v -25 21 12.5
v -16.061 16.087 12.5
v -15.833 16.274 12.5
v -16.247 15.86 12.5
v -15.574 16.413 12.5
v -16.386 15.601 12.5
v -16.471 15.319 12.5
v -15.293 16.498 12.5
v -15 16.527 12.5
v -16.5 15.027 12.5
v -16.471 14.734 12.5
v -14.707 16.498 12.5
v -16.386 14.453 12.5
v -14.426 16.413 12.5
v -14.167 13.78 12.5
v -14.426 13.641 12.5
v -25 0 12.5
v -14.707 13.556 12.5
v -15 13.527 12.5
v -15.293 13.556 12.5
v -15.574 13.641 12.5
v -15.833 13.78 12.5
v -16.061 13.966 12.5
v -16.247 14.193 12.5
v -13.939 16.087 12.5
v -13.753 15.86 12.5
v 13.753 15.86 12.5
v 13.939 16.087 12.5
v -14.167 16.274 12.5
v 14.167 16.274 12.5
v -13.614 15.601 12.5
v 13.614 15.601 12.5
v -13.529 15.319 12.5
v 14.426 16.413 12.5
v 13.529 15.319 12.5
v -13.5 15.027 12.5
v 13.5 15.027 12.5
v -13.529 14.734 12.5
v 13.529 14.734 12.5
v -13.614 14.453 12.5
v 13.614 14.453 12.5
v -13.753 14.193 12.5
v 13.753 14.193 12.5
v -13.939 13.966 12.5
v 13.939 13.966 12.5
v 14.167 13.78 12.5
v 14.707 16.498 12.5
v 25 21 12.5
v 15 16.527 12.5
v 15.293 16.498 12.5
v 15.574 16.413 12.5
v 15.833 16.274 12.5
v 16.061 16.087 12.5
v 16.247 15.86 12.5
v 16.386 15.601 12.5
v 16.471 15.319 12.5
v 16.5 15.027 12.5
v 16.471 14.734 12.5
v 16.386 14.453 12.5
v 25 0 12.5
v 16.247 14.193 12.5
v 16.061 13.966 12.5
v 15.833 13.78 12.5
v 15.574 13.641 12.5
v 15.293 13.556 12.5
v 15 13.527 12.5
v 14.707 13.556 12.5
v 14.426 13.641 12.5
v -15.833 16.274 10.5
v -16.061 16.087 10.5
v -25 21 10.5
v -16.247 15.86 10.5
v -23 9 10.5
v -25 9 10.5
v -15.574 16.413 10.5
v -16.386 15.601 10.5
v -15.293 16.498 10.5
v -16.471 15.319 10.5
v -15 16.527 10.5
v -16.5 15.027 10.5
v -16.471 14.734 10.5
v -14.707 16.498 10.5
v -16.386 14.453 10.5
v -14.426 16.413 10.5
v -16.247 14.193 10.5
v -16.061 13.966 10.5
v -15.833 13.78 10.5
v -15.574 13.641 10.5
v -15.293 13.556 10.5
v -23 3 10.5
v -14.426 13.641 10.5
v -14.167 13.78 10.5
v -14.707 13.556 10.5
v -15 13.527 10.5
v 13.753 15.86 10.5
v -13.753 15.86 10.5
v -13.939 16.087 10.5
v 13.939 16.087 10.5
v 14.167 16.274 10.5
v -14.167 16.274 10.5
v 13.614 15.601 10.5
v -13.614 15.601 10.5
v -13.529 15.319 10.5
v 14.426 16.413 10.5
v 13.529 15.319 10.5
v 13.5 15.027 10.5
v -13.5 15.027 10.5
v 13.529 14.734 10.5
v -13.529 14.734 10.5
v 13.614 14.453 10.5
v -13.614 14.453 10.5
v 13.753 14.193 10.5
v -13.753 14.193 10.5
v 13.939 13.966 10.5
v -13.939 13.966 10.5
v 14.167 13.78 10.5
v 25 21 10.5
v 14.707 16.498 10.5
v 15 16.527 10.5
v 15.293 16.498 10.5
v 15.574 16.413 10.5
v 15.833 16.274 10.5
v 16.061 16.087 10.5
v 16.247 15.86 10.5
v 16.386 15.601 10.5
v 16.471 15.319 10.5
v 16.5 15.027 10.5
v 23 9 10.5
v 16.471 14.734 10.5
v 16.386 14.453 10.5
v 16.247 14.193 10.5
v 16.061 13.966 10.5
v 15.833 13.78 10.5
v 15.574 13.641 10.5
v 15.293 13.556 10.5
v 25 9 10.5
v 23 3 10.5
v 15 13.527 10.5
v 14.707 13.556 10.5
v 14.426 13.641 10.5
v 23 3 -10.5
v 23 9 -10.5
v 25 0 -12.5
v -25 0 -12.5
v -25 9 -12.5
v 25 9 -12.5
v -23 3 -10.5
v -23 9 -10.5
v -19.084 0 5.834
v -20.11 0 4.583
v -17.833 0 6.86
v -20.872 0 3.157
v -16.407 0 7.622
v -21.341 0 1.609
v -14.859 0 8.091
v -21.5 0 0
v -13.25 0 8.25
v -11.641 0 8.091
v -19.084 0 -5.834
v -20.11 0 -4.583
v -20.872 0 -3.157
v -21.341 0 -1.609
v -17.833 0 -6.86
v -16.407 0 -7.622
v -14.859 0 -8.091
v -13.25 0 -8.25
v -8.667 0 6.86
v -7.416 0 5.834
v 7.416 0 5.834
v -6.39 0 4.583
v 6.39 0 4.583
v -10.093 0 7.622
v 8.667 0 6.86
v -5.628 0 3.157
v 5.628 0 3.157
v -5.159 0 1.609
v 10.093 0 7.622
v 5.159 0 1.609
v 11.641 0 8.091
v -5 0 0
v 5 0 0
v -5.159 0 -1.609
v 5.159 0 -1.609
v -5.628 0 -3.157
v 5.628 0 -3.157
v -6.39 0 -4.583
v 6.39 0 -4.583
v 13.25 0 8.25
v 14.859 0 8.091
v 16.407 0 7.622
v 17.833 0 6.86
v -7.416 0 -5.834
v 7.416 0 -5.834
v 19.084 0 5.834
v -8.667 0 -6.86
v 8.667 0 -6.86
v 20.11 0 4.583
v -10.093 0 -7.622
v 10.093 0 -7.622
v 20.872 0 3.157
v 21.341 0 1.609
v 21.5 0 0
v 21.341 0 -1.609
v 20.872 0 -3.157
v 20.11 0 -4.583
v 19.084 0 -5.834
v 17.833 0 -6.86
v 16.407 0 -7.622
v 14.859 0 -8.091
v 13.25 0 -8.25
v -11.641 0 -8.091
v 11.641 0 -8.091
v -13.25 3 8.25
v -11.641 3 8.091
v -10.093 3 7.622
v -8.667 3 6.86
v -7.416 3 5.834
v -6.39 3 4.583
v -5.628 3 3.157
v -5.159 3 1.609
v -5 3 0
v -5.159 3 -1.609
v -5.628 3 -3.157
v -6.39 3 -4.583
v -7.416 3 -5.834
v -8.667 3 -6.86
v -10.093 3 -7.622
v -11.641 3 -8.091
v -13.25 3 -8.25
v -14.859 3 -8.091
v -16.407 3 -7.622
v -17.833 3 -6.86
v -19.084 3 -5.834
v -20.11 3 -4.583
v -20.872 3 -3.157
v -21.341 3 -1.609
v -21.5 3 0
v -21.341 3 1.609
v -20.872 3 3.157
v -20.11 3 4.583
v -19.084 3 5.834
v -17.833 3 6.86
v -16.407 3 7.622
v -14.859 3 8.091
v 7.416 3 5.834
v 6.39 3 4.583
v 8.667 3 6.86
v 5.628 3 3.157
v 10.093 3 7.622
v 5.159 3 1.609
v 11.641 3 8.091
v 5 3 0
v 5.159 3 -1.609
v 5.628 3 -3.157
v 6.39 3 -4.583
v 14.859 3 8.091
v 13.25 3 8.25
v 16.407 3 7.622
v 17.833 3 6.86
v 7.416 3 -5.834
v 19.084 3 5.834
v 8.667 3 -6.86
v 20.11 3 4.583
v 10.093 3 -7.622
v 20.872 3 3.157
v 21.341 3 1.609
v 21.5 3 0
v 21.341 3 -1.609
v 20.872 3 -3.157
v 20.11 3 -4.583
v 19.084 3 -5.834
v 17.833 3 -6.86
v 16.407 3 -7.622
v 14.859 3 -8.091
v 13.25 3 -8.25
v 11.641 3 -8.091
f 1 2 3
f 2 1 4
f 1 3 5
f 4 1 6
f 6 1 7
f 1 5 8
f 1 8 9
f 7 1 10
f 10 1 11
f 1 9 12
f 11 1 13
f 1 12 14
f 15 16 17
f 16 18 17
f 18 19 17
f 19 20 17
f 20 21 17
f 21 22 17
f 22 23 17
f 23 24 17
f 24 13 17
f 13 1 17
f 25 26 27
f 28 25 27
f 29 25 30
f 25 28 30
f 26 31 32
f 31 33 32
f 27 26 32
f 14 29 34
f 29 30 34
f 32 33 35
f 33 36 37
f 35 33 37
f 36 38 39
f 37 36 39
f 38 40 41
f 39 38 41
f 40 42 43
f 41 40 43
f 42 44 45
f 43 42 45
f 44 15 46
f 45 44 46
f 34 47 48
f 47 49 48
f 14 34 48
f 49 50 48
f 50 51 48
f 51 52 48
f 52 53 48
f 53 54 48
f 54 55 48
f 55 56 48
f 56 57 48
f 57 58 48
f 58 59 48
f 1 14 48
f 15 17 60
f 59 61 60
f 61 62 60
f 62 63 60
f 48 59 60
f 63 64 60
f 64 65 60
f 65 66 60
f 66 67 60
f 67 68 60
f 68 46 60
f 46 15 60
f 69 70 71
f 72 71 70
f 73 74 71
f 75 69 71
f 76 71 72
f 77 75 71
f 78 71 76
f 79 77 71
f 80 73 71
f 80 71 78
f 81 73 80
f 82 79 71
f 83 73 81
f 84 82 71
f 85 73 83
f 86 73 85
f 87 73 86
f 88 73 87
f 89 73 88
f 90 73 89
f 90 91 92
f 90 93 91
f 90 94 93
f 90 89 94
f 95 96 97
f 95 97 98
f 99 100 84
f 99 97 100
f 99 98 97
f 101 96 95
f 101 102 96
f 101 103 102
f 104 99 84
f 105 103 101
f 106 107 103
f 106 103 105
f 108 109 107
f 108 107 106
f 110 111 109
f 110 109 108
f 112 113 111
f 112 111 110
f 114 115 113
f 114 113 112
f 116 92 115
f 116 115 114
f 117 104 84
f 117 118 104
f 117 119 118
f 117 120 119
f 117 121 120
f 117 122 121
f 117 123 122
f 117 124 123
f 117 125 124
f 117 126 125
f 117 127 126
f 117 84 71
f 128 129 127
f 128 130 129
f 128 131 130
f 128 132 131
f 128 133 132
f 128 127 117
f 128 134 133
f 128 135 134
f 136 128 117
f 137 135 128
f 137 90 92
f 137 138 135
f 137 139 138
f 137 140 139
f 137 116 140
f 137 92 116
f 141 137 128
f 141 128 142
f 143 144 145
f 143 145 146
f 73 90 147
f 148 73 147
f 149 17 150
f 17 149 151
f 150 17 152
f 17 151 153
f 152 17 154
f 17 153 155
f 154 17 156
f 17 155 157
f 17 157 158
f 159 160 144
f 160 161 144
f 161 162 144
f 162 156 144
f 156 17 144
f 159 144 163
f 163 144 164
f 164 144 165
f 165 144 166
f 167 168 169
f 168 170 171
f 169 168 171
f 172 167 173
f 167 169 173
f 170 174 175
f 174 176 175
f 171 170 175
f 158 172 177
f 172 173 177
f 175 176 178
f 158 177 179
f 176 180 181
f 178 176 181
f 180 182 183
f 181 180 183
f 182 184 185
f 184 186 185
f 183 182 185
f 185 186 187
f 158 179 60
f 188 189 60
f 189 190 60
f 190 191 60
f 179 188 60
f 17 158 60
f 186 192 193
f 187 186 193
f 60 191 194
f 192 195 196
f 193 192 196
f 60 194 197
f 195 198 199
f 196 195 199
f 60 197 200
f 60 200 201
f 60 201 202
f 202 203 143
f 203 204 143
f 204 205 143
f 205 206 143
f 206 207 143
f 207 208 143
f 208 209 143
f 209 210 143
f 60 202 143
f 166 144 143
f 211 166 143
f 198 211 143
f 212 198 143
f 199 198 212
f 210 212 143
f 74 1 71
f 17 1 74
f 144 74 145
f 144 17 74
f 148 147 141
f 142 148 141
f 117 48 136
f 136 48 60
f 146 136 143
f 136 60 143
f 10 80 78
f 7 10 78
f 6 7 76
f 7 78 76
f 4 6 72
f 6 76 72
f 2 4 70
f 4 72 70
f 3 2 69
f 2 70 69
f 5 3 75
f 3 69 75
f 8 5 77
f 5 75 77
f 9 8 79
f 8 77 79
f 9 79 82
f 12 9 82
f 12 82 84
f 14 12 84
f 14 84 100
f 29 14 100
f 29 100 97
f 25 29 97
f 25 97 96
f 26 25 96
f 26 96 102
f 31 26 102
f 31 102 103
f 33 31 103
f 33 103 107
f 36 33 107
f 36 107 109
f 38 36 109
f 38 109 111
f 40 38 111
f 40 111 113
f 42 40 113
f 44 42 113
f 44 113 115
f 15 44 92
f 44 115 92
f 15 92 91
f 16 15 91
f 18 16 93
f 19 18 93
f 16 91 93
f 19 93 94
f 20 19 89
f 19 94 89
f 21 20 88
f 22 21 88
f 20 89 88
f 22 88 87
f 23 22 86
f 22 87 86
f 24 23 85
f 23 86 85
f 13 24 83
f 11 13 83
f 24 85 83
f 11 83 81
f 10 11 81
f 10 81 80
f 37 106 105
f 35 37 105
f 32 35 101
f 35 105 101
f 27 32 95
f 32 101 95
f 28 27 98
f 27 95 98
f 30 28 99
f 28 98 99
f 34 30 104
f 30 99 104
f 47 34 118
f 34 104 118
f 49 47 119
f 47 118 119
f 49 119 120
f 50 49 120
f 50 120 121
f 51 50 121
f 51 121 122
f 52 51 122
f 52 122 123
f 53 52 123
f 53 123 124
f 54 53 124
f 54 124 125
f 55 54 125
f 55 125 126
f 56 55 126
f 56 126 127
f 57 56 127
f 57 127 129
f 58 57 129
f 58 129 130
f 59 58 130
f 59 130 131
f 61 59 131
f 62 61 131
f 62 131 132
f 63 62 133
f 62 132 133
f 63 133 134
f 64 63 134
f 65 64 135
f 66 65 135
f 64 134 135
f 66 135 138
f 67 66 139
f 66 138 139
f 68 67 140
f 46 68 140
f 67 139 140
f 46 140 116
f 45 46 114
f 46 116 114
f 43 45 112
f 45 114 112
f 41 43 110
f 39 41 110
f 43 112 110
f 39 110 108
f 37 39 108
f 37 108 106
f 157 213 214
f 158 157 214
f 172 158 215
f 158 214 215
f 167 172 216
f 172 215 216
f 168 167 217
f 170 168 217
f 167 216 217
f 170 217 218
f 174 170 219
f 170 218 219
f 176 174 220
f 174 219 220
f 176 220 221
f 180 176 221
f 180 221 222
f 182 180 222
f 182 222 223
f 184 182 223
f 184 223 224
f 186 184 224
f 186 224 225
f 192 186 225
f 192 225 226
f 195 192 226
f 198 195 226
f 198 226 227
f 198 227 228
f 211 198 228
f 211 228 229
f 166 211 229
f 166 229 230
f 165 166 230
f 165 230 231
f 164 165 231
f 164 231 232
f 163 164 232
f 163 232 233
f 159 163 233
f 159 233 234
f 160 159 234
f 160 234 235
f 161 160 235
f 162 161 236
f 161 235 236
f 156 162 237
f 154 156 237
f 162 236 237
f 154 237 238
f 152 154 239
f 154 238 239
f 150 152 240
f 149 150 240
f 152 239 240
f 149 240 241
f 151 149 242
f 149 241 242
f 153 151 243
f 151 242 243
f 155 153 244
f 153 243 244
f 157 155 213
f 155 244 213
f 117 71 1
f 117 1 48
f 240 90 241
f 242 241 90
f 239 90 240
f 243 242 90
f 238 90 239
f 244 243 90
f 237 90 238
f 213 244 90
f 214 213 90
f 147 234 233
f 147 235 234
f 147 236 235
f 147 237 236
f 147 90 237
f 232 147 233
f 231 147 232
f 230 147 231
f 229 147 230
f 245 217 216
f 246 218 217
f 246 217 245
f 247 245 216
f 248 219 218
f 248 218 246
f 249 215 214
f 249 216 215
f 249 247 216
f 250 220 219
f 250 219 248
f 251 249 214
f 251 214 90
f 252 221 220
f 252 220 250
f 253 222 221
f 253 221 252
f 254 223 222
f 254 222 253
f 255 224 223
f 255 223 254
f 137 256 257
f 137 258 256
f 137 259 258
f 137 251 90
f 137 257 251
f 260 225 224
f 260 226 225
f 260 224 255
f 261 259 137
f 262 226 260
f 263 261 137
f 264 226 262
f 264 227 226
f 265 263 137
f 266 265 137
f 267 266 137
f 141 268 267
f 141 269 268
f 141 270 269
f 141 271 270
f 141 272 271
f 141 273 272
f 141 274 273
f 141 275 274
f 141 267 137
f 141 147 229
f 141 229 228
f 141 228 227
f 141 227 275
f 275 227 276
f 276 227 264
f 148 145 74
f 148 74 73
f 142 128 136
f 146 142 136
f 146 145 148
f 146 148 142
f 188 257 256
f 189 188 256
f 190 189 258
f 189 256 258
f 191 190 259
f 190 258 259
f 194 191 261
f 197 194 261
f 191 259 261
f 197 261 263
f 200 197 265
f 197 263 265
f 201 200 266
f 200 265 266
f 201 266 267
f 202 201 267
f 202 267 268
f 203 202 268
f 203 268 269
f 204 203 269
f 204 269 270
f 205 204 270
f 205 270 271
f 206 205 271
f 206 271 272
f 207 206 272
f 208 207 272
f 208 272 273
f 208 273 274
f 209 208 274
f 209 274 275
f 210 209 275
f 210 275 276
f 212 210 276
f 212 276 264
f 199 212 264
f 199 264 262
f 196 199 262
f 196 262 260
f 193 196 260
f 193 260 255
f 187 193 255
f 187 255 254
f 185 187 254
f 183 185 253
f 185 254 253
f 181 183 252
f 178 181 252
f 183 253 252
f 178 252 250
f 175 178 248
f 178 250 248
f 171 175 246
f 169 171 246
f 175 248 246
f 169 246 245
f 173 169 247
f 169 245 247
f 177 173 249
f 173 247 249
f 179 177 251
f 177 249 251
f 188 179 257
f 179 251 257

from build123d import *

# Parameters (mm, degrees)
SKETCH1_W           = 50
SKETCH1_H           = 25
BOSS_EXTRUDE2_DEPTH = 3
SKETCH3_R           = 8.25
CUT_EXTRUDE2_DEPTH  = 29.111385594
SKETCH6_W           = 50
SKETCH6_H           = 25
SKETCH6_W_2         = 46
SKETCH6_H_2         = 21
BOSS_EXTRUDE3_DEPTH = 6
SKETCH7_W           = 50
SKETCH7_H           = 2
BOSS_EXTRUDE4_DEPTH = 12
SKETCH9_R           = 1.5
CUT_EXTRUDE3_DEPTH  = 40.937451095


with BuildPart() as part:
    # Sketch1 → Boss-Extrude2 (new body)
    with BuildSketch(Plane(origin=(0, 0, 0), x_dir=(1, 0, 0), z_dir=(0, 1, 0))):
        Rectangle(SKETCH1_W, SKETCH1_H)
    extrude(amount=BOSS_EXTRUDE2_DEPTH)

    # Sketch3 → Cut-Extrude2 (cut, through all)
    with BuildSketch(Plane(origin=(0, 3, 0), x_dir=(1, 0, 0), z_dir=(0, 1, 0))):
        with Locations(Location((13.25, 0, 0), (0, 0, 270))):
            Circle(SKETCH3_R)
        with Locations(Location((-13.25, 0, 0), (0, 0, 270))):
            Circle(SKETCH3_R)
    extrude(amount=-CUT_EXTRUDE2_DEPTH, mode=Mode.SUBTRACT)

    # Sketch6 → Boss-Extrude3 (add)
    with BuildSketch(Plane(origin=(0, 3, 0), x_dir=(1, 0, 0), z_dir=(0, 1, 0))):
        Rectangle(SKETCH6_W, SKETCH6_H)
        Rectangle(SKETCH6_W_2, SKETCH6_H_2, mode=Mode.SUBTRACT)
    extrude(amount=BOSS_EXTRUDE3_DEPTH)

    # Sketch7 → Boss-Extrude4 (add)
    with BuildSketch(Plane(origin=(0, 9, 0), x_dir=(1, 0, 0), z_dir=(0, 1, 0))):
        with Locations((0, -11.5)):
            Rectangle(SKETCH7_W, SKETCH7_H)
    extrude(amount=BOSS_EXTRUDE4_DEPTH)

    # Sketch9 → Cut-Extrude3 (cut, through all)
    with BuildSketch(Plane(origin=(0, 0, 10.5), x_dir=(-1, 0, 0), z_dir=(0, 0, -1))):
        with Locations((-15, 15.02673795)):
            Circle(SKETCH9_R)
        with Locations((15, 15.02673795)):
            Circle(SKETCH9_R)
    extrude(amount=-CUT_EXTRUDE3_DEPTH, mode=Mode.SUBTRACT)


solid = part.part
